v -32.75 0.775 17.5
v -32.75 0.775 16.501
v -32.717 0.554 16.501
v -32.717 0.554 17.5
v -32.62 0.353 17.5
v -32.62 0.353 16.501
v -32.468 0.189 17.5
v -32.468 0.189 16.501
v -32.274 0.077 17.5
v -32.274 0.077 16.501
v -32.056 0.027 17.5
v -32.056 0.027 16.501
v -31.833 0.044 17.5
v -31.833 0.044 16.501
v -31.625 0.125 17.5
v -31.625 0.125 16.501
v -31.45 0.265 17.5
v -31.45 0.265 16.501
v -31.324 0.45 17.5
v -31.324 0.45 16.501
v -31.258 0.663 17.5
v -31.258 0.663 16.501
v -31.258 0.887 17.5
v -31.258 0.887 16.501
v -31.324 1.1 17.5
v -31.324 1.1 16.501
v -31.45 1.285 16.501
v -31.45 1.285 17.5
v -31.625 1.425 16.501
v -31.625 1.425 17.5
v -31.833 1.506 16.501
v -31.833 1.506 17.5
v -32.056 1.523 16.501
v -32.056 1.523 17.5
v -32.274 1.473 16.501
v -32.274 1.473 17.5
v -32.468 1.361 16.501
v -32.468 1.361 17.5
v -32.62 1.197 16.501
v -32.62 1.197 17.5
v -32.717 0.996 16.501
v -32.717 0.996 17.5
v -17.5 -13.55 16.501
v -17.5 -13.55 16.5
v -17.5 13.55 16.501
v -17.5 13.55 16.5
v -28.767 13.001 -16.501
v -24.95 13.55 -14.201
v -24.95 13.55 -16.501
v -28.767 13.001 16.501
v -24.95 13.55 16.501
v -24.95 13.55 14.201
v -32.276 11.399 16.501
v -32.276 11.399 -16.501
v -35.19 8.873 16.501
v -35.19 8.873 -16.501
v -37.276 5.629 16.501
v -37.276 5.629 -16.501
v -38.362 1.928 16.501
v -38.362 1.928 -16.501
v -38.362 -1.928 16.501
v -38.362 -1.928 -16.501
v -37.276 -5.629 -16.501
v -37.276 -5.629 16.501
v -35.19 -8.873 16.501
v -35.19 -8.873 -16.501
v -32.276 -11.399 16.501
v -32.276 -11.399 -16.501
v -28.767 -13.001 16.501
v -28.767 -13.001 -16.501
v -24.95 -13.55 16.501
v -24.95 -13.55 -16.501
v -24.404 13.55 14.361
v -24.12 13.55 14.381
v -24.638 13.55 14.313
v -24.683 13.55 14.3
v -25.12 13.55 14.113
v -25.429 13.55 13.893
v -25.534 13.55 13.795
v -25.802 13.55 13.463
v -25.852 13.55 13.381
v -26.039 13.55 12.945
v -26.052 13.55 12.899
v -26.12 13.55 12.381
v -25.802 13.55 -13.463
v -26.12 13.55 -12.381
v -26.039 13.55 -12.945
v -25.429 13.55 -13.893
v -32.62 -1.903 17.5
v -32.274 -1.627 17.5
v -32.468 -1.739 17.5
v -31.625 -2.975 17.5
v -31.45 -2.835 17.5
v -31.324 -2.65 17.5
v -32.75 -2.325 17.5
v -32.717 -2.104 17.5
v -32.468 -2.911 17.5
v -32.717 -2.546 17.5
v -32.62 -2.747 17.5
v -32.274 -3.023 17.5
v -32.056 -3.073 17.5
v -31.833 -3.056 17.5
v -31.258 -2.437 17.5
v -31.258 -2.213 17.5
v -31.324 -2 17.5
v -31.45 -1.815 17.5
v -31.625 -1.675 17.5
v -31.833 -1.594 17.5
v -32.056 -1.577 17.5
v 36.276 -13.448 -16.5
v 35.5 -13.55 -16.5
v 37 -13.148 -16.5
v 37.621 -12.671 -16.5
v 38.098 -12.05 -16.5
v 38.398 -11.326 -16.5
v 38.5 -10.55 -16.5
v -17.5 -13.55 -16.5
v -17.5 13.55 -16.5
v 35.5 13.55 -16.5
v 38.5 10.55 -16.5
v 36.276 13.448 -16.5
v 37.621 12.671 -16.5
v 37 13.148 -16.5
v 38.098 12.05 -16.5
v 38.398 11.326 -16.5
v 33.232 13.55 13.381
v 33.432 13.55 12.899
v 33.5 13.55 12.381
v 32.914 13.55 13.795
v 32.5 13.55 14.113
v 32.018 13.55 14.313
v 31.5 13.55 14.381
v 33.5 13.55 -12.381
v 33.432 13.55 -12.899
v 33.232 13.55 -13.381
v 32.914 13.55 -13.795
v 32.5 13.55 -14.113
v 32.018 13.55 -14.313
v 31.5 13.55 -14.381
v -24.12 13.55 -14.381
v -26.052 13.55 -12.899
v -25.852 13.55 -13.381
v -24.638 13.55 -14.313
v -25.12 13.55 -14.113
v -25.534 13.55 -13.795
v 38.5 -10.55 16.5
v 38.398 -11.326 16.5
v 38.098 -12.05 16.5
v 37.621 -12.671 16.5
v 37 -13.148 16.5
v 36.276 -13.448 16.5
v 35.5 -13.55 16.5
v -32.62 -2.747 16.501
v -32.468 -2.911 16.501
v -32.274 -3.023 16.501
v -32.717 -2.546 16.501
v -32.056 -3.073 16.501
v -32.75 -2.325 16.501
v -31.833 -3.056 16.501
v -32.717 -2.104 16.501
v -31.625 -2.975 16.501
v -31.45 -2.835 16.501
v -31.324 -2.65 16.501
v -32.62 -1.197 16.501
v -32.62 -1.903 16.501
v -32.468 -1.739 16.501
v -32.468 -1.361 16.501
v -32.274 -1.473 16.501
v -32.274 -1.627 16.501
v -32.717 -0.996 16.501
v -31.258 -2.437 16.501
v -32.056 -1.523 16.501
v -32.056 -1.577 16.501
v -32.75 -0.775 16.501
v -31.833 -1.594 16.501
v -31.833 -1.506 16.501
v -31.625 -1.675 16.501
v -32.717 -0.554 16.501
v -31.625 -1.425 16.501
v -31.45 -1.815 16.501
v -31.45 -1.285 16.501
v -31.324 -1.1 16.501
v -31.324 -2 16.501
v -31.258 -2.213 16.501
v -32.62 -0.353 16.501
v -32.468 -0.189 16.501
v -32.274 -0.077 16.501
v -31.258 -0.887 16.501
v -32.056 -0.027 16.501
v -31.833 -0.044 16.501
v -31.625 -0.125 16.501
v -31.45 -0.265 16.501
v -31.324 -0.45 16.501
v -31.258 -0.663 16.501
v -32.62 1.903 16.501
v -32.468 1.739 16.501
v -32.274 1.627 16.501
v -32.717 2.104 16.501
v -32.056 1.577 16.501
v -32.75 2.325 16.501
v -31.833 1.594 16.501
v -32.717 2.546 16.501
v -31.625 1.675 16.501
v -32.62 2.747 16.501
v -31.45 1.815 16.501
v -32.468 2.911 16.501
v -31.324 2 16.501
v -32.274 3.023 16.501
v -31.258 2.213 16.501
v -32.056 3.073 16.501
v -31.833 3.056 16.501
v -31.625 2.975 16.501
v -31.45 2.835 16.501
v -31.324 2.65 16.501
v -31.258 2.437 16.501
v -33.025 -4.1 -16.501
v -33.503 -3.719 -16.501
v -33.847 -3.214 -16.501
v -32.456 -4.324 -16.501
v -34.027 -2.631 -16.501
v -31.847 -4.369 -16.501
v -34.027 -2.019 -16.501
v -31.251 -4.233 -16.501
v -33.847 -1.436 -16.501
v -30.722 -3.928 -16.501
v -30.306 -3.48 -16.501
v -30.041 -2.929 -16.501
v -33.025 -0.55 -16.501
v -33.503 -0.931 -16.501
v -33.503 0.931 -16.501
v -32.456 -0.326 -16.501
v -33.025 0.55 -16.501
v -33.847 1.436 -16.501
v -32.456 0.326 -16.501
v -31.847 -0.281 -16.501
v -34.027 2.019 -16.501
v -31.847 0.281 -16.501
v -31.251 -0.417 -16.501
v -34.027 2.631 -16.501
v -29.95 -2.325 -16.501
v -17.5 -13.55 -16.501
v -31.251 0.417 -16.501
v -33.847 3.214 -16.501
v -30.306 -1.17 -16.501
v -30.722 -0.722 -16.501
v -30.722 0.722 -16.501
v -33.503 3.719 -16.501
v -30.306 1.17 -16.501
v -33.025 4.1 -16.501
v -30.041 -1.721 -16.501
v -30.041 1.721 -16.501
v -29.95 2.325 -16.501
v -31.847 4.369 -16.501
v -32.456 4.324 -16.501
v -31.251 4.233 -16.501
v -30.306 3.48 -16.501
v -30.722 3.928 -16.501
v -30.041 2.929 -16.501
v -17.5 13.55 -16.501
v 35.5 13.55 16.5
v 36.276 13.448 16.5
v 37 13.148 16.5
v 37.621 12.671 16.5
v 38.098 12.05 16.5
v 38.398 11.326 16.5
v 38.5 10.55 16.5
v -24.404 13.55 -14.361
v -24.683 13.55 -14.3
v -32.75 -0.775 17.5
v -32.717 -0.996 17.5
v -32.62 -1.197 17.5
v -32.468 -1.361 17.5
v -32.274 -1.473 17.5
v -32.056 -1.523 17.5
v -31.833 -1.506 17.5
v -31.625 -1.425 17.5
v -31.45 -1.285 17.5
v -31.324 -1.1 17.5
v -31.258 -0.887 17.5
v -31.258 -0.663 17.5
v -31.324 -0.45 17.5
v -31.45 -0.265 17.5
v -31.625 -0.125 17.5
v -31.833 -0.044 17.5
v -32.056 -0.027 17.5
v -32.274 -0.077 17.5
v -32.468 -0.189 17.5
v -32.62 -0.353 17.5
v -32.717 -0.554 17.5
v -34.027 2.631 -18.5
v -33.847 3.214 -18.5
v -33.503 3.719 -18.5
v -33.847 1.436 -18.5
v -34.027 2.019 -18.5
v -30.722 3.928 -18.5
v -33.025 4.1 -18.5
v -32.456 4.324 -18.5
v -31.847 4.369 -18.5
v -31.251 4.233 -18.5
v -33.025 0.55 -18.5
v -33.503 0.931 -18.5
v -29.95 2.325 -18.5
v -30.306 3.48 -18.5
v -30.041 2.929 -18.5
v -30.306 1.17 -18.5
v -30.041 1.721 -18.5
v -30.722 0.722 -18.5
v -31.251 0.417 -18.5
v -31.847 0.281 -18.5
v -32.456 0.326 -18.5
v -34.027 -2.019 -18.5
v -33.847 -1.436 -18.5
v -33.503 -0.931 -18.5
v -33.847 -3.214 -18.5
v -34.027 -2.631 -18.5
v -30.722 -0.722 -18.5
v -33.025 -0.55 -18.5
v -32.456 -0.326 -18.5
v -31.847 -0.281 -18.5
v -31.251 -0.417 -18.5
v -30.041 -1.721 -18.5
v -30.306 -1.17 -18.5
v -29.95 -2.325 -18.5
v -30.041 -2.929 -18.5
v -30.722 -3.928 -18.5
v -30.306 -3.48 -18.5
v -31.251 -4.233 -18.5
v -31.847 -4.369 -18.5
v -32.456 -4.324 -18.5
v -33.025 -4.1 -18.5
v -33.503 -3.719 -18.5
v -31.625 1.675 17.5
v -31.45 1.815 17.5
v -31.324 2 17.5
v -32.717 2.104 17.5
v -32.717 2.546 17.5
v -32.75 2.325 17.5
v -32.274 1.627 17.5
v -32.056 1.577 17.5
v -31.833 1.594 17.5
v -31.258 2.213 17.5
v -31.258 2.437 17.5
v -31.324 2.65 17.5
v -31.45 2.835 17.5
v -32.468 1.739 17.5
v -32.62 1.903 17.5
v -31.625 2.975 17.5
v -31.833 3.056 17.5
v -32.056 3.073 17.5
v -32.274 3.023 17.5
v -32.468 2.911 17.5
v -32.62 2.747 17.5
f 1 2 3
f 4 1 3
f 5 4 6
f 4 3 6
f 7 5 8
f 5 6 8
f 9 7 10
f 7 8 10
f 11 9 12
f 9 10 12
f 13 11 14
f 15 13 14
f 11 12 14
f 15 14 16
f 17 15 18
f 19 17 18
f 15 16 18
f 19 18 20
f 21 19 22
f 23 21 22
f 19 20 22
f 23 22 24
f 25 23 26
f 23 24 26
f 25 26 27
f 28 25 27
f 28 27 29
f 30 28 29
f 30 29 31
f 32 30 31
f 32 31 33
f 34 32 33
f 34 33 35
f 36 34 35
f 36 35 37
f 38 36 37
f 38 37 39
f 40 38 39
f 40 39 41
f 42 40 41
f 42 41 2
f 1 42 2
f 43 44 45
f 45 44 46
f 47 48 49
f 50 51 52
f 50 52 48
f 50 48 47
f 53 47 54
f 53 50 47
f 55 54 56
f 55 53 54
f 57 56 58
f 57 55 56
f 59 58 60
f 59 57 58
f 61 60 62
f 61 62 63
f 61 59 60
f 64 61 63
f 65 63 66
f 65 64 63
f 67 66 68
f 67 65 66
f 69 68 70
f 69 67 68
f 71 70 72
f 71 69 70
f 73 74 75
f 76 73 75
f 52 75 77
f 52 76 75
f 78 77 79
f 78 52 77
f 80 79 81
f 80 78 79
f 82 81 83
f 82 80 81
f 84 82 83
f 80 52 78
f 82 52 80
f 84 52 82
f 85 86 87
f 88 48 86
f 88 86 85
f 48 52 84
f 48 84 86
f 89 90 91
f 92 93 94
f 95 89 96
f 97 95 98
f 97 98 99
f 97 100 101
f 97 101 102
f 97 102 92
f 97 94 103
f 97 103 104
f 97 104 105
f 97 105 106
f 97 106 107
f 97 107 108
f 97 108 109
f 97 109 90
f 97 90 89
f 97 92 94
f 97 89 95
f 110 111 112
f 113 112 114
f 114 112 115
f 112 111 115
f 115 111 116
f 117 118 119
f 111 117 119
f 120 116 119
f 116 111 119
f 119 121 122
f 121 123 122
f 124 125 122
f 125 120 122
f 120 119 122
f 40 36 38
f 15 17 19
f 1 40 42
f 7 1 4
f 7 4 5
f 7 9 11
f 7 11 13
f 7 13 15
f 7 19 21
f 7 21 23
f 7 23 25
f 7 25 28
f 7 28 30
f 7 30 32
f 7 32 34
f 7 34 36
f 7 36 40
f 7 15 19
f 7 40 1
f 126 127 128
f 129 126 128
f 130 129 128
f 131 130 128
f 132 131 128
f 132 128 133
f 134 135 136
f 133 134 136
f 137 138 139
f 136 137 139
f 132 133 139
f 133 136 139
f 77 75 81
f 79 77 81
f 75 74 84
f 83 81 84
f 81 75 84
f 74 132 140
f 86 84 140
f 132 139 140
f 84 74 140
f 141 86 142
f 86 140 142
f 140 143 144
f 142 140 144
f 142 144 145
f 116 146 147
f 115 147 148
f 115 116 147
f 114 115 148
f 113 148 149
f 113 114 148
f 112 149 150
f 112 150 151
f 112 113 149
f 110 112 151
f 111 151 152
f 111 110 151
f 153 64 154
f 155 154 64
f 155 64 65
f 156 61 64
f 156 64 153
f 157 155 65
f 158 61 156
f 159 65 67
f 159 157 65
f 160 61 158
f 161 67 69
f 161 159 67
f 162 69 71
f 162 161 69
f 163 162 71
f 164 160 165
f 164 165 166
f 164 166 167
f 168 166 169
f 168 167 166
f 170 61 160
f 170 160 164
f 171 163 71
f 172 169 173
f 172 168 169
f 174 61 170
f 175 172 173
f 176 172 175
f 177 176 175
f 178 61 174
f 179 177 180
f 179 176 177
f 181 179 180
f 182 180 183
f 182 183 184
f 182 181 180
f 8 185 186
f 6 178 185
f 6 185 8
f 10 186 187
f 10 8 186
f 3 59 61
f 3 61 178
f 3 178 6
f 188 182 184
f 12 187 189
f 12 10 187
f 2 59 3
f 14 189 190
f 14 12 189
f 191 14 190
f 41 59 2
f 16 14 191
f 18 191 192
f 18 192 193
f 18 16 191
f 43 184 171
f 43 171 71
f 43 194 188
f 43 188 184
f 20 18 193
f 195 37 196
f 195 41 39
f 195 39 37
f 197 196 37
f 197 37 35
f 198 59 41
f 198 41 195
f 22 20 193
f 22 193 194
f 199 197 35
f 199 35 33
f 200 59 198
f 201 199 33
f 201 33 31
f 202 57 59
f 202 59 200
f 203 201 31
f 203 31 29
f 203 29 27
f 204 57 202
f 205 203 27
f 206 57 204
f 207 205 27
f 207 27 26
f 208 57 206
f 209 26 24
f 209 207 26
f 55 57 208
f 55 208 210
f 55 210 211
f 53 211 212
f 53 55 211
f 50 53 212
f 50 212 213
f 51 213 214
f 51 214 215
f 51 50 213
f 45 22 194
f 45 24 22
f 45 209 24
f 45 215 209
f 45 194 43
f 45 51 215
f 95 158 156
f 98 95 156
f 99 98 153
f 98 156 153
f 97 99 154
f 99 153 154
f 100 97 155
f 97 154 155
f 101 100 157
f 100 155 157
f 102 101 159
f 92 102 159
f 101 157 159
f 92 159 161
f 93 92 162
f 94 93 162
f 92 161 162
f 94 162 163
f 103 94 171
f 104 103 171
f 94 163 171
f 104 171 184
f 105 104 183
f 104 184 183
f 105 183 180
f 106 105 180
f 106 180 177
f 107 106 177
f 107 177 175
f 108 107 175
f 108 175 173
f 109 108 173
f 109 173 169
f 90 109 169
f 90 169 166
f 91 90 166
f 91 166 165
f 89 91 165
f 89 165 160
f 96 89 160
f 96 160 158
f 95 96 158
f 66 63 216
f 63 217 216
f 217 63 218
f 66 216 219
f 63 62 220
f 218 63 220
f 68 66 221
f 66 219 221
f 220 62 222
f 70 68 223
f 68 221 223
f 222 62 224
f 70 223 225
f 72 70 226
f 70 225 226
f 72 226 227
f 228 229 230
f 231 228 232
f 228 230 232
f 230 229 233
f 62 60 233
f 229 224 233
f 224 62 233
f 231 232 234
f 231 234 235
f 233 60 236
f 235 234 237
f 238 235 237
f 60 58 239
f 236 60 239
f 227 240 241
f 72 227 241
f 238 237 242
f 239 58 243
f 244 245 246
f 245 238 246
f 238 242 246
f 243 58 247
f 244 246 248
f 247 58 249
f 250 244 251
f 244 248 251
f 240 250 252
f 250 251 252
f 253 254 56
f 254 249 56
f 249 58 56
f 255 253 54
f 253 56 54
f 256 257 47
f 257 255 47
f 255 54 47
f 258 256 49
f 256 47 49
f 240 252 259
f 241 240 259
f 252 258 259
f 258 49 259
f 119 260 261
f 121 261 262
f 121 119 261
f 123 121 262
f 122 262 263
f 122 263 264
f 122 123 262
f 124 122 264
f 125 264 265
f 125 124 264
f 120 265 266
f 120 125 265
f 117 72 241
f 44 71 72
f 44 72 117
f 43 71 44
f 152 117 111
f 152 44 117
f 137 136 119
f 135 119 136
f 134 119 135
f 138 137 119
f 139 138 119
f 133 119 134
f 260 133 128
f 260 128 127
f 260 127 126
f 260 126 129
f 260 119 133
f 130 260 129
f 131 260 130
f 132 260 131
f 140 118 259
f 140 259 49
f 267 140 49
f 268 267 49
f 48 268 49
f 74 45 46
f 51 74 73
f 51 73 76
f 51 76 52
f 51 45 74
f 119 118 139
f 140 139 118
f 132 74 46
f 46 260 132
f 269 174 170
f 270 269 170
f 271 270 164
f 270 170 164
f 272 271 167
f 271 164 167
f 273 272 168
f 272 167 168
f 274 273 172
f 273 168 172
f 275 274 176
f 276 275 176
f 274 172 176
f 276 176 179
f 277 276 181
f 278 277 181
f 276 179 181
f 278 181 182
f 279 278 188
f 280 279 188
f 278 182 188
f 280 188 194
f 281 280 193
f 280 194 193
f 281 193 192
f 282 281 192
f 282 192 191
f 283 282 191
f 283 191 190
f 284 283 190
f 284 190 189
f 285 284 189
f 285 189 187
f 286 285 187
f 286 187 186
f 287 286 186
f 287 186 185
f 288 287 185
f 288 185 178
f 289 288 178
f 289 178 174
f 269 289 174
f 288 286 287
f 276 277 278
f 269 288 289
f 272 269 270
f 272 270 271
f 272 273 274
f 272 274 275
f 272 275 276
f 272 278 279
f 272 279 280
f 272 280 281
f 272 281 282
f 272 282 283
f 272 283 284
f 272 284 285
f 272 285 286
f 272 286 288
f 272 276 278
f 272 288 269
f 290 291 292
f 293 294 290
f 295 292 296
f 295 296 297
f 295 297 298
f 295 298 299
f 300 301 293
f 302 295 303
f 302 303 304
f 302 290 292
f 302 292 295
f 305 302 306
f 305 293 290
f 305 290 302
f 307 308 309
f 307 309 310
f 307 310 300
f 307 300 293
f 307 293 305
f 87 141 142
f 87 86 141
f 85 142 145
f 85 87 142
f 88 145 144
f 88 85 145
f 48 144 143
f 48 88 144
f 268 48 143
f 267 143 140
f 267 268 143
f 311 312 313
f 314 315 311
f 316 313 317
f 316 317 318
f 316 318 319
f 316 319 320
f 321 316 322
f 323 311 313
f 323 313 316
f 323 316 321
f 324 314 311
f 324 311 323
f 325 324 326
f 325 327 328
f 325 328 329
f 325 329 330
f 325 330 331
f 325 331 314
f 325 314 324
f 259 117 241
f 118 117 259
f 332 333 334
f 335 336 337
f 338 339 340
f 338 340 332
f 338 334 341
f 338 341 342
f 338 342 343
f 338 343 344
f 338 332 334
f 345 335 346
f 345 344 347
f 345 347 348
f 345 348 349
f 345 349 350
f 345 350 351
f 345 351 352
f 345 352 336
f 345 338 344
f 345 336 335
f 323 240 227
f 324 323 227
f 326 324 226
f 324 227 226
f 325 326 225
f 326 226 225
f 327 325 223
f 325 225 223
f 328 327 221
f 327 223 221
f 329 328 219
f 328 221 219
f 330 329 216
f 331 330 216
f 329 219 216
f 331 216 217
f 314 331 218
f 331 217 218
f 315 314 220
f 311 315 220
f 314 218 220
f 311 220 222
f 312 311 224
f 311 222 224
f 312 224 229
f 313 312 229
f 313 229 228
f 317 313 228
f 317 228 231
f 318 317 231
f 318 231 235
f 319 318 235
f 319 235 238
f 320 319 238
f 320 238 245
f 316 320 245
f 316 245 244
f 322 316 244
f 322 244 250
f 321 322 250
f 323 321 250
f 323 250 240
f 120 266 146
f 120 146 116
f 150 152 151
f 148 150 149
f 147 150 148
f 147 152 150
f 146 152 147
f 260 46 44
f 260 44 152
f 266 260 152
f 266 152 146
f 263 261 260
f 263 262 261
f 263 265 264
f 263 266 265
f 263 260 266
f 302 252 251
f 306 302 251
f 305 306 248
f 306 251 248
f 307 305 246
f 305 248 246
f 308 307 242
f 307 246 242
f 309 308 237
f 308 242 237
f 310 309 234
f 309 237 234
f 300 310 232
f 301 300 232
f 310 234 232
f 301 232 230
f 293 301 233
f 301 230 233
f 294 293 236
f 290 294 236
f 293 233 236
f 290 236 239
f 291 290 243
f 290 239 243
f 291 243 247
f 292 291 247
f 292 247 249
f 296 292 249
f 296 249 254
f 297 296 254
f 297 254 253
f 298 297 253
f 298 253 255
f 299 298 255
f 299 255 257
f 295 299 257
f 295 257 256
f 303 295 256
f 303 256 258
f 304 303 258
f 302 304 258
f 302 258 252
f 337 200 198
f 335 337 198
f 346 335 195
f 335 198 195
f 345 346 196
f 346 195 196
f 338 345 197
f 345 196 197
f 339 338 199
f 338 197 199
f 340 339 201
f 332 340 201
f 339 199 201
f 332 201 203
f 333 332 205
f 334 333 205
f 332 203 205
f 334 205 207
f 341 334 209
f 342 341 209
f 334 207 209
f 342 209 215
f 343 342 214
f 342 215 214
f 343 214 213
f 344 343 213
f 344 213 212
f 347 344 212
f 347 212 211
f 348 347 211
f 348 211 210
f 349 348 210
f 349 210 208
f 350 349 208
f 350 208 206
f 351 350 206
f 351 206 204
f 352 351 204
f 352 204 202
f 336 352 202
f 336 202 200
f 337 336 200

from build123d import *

# Parameters (mm, degrees)
ESBO_O1_W                = 77
ESBO_O1_H                = 33
RESSALTO_EXTRUS_O1_DEPTH = 13.55
FILETE1_RADIUS           = 13.55
FILETE1_LENGTH           = 33
FILETE2_R                = 3
ESBO_O2_R                = 0.75
RESSALTO_EXTRUS_O6_DEPTH = 1
ESBO_O3_R                = 2.05
RESSALTO_EXTRUS_O7_DEPTH = 2
RESSALTO_EXTRUS_O8_DEPTH = 0.001
RESSALTO_EXTRUS_O9_DEPTH = 0.0001


with BuildPart() as part:
    # Esboço1 → Ressalto-extrusão1 (new, symmetric)
    with BuildSketch(Plane(origin=(0, 0, 0), x_dir=(1, 0, 0), z_dir=(0, 1, 0))):
        Rectangle(ESBO_O1_W, ESBO_O1_H)
    extrude(amount=RESSALTO_EXTRUS_O1_DEPTH, both=True)

    # Filete1: full round fillet: the end face becomes a half cylinder, R = half its width
    filete1_face = Plane((-38.5, 0, 0), x_dir=(0, 0, -1), z_dir=(-1, 0, 0))  # on the end face: x along it, z out of the body
    filete1_slab = filete1_face.offset(-FILETE1_RADIUS / 2) * Box(FILETE1_LENGTH, 2 * FILETE1_RADIUS, FILETE1_RADIUS, mode=Mode.PRIVATE)  # the body's end, R deep
    filete1_round = Plane((-24.95, 0, 0), x_dir=(-1, 0, 0), z_dir=(0, 0, -1)) * Cylinder(FILETE1_RADIUS, FILETE1_LENGTH, mode=Mode.PRIVATE)  # its axis R under the face
    add(filete1_slab - filete1_round, mode=Mode.SUBTRACT)

    # Filete2
    filete2_edges = [part.edges().sort_by_distance(p)[0] for p in [
        (38.5, 13.55, 0),
        (38.5, -13.55, 0),
    ]]
    fillet(filete2_edges, radius=FILETE2_R)

    # Esboço2 → Ressalto-extrusão6 (add)
    with BuildSketch(Plane.XY.offset(16.5)):
        with Locations(Location((-32, 2.325, 0), (0, 0, 180))):
            Circle(ESBO_O2_R)
        with Locations(Location((-32, 0.775, 0), (0, 0, 180))):
            Circle(ESBO_O2_R)
        with Locations(Location((-32, -0.775, 0), (0, 0, 180))):
            Circle(ESBO_O2_R)
        with Locations(Location((-32, -2.325, 0), (0, 0, 180))):
            Circle(ESBO_O2_R)
    extrude(amount=RESSALTO_EXTRUS_O6_DEPTH)

    # Esboço3 → Ressalto-extrusão7 (add)
    with BuildSketch(Plane(origin=(0, 0, -16.5), x_dir=(-1, 0, 0), z_dir=(0, 0, -1))):
        with Locations(Location((32, 2.325, 0), (0, 0, 180))):
            Circle(ESBO_O3_R)
        with Locations(Location((32, -2.325, 0), (0, 0, 180))):
            Circle(ESBO_O3_R)
    extrude(amount=RESSALTO_EXTRUS_O7_DEPTH)

    # Esboço4 → Ressalto-extrusão8 (add)
    with BuildSketch(Plane.XY.offset(16.5)):
        with BuildLine():
            Line((-17.5, -13.55), (-17.5, 13.55))
            Line((-17.5, 13.55), (-24.95, 13.55))
            ThreePointArc((-24.95, 13.55), (-38.5, 0), (-24.95, -13.55))
            Line((-24.95, -13.55), (-17.5, -13.55))
        make_face()
    ressalto_extrus_o8 = extrude(amount=RESSALTO_EXTRUS_O8_DEPTH)

    # Espelhar1: Ressalto-extrusão8 across plane
    add(ressalto_extrus_o8.mirror(Plane.XY))

    # Esboço6 → Ressalto-extrusão9 (add)
    with BuildSketch(Plane(origin=(0, 13.55, 0), x_dir=(1, 0, 0), z_dir=(0, 1, 0))):
        with BuildLine():
            Line((-24.12, 14.381), (31.5, 14.381))
            ThreePointArc((31.5, 14.381), (32.914213562, 13.795213562), (33.5, 12.381))
            Line((33.5, 12.381), (33.5, -12.381))
            ThreePointArc((33.5, -12.381), (32.914213562, -13.795213562), (31.5, -14.381))
            Line((31.5, -14.381), (-24.12, -14.381))
            ThreePointArc((-24.12, -14.381), (-25.534213562, -13.795213562), (-26.12, -12.381))
            Line((-26.12, -12.381), (-26.12, 12.381))
            ThreePointArc((-26.12, 12.381), (-25.534213562, 13.795213562), (-24.12, 14.381))
        make_face()
    extrude(amount=RESSALTO_EXTRUS_O9_DEPTH)


solid = part.part
